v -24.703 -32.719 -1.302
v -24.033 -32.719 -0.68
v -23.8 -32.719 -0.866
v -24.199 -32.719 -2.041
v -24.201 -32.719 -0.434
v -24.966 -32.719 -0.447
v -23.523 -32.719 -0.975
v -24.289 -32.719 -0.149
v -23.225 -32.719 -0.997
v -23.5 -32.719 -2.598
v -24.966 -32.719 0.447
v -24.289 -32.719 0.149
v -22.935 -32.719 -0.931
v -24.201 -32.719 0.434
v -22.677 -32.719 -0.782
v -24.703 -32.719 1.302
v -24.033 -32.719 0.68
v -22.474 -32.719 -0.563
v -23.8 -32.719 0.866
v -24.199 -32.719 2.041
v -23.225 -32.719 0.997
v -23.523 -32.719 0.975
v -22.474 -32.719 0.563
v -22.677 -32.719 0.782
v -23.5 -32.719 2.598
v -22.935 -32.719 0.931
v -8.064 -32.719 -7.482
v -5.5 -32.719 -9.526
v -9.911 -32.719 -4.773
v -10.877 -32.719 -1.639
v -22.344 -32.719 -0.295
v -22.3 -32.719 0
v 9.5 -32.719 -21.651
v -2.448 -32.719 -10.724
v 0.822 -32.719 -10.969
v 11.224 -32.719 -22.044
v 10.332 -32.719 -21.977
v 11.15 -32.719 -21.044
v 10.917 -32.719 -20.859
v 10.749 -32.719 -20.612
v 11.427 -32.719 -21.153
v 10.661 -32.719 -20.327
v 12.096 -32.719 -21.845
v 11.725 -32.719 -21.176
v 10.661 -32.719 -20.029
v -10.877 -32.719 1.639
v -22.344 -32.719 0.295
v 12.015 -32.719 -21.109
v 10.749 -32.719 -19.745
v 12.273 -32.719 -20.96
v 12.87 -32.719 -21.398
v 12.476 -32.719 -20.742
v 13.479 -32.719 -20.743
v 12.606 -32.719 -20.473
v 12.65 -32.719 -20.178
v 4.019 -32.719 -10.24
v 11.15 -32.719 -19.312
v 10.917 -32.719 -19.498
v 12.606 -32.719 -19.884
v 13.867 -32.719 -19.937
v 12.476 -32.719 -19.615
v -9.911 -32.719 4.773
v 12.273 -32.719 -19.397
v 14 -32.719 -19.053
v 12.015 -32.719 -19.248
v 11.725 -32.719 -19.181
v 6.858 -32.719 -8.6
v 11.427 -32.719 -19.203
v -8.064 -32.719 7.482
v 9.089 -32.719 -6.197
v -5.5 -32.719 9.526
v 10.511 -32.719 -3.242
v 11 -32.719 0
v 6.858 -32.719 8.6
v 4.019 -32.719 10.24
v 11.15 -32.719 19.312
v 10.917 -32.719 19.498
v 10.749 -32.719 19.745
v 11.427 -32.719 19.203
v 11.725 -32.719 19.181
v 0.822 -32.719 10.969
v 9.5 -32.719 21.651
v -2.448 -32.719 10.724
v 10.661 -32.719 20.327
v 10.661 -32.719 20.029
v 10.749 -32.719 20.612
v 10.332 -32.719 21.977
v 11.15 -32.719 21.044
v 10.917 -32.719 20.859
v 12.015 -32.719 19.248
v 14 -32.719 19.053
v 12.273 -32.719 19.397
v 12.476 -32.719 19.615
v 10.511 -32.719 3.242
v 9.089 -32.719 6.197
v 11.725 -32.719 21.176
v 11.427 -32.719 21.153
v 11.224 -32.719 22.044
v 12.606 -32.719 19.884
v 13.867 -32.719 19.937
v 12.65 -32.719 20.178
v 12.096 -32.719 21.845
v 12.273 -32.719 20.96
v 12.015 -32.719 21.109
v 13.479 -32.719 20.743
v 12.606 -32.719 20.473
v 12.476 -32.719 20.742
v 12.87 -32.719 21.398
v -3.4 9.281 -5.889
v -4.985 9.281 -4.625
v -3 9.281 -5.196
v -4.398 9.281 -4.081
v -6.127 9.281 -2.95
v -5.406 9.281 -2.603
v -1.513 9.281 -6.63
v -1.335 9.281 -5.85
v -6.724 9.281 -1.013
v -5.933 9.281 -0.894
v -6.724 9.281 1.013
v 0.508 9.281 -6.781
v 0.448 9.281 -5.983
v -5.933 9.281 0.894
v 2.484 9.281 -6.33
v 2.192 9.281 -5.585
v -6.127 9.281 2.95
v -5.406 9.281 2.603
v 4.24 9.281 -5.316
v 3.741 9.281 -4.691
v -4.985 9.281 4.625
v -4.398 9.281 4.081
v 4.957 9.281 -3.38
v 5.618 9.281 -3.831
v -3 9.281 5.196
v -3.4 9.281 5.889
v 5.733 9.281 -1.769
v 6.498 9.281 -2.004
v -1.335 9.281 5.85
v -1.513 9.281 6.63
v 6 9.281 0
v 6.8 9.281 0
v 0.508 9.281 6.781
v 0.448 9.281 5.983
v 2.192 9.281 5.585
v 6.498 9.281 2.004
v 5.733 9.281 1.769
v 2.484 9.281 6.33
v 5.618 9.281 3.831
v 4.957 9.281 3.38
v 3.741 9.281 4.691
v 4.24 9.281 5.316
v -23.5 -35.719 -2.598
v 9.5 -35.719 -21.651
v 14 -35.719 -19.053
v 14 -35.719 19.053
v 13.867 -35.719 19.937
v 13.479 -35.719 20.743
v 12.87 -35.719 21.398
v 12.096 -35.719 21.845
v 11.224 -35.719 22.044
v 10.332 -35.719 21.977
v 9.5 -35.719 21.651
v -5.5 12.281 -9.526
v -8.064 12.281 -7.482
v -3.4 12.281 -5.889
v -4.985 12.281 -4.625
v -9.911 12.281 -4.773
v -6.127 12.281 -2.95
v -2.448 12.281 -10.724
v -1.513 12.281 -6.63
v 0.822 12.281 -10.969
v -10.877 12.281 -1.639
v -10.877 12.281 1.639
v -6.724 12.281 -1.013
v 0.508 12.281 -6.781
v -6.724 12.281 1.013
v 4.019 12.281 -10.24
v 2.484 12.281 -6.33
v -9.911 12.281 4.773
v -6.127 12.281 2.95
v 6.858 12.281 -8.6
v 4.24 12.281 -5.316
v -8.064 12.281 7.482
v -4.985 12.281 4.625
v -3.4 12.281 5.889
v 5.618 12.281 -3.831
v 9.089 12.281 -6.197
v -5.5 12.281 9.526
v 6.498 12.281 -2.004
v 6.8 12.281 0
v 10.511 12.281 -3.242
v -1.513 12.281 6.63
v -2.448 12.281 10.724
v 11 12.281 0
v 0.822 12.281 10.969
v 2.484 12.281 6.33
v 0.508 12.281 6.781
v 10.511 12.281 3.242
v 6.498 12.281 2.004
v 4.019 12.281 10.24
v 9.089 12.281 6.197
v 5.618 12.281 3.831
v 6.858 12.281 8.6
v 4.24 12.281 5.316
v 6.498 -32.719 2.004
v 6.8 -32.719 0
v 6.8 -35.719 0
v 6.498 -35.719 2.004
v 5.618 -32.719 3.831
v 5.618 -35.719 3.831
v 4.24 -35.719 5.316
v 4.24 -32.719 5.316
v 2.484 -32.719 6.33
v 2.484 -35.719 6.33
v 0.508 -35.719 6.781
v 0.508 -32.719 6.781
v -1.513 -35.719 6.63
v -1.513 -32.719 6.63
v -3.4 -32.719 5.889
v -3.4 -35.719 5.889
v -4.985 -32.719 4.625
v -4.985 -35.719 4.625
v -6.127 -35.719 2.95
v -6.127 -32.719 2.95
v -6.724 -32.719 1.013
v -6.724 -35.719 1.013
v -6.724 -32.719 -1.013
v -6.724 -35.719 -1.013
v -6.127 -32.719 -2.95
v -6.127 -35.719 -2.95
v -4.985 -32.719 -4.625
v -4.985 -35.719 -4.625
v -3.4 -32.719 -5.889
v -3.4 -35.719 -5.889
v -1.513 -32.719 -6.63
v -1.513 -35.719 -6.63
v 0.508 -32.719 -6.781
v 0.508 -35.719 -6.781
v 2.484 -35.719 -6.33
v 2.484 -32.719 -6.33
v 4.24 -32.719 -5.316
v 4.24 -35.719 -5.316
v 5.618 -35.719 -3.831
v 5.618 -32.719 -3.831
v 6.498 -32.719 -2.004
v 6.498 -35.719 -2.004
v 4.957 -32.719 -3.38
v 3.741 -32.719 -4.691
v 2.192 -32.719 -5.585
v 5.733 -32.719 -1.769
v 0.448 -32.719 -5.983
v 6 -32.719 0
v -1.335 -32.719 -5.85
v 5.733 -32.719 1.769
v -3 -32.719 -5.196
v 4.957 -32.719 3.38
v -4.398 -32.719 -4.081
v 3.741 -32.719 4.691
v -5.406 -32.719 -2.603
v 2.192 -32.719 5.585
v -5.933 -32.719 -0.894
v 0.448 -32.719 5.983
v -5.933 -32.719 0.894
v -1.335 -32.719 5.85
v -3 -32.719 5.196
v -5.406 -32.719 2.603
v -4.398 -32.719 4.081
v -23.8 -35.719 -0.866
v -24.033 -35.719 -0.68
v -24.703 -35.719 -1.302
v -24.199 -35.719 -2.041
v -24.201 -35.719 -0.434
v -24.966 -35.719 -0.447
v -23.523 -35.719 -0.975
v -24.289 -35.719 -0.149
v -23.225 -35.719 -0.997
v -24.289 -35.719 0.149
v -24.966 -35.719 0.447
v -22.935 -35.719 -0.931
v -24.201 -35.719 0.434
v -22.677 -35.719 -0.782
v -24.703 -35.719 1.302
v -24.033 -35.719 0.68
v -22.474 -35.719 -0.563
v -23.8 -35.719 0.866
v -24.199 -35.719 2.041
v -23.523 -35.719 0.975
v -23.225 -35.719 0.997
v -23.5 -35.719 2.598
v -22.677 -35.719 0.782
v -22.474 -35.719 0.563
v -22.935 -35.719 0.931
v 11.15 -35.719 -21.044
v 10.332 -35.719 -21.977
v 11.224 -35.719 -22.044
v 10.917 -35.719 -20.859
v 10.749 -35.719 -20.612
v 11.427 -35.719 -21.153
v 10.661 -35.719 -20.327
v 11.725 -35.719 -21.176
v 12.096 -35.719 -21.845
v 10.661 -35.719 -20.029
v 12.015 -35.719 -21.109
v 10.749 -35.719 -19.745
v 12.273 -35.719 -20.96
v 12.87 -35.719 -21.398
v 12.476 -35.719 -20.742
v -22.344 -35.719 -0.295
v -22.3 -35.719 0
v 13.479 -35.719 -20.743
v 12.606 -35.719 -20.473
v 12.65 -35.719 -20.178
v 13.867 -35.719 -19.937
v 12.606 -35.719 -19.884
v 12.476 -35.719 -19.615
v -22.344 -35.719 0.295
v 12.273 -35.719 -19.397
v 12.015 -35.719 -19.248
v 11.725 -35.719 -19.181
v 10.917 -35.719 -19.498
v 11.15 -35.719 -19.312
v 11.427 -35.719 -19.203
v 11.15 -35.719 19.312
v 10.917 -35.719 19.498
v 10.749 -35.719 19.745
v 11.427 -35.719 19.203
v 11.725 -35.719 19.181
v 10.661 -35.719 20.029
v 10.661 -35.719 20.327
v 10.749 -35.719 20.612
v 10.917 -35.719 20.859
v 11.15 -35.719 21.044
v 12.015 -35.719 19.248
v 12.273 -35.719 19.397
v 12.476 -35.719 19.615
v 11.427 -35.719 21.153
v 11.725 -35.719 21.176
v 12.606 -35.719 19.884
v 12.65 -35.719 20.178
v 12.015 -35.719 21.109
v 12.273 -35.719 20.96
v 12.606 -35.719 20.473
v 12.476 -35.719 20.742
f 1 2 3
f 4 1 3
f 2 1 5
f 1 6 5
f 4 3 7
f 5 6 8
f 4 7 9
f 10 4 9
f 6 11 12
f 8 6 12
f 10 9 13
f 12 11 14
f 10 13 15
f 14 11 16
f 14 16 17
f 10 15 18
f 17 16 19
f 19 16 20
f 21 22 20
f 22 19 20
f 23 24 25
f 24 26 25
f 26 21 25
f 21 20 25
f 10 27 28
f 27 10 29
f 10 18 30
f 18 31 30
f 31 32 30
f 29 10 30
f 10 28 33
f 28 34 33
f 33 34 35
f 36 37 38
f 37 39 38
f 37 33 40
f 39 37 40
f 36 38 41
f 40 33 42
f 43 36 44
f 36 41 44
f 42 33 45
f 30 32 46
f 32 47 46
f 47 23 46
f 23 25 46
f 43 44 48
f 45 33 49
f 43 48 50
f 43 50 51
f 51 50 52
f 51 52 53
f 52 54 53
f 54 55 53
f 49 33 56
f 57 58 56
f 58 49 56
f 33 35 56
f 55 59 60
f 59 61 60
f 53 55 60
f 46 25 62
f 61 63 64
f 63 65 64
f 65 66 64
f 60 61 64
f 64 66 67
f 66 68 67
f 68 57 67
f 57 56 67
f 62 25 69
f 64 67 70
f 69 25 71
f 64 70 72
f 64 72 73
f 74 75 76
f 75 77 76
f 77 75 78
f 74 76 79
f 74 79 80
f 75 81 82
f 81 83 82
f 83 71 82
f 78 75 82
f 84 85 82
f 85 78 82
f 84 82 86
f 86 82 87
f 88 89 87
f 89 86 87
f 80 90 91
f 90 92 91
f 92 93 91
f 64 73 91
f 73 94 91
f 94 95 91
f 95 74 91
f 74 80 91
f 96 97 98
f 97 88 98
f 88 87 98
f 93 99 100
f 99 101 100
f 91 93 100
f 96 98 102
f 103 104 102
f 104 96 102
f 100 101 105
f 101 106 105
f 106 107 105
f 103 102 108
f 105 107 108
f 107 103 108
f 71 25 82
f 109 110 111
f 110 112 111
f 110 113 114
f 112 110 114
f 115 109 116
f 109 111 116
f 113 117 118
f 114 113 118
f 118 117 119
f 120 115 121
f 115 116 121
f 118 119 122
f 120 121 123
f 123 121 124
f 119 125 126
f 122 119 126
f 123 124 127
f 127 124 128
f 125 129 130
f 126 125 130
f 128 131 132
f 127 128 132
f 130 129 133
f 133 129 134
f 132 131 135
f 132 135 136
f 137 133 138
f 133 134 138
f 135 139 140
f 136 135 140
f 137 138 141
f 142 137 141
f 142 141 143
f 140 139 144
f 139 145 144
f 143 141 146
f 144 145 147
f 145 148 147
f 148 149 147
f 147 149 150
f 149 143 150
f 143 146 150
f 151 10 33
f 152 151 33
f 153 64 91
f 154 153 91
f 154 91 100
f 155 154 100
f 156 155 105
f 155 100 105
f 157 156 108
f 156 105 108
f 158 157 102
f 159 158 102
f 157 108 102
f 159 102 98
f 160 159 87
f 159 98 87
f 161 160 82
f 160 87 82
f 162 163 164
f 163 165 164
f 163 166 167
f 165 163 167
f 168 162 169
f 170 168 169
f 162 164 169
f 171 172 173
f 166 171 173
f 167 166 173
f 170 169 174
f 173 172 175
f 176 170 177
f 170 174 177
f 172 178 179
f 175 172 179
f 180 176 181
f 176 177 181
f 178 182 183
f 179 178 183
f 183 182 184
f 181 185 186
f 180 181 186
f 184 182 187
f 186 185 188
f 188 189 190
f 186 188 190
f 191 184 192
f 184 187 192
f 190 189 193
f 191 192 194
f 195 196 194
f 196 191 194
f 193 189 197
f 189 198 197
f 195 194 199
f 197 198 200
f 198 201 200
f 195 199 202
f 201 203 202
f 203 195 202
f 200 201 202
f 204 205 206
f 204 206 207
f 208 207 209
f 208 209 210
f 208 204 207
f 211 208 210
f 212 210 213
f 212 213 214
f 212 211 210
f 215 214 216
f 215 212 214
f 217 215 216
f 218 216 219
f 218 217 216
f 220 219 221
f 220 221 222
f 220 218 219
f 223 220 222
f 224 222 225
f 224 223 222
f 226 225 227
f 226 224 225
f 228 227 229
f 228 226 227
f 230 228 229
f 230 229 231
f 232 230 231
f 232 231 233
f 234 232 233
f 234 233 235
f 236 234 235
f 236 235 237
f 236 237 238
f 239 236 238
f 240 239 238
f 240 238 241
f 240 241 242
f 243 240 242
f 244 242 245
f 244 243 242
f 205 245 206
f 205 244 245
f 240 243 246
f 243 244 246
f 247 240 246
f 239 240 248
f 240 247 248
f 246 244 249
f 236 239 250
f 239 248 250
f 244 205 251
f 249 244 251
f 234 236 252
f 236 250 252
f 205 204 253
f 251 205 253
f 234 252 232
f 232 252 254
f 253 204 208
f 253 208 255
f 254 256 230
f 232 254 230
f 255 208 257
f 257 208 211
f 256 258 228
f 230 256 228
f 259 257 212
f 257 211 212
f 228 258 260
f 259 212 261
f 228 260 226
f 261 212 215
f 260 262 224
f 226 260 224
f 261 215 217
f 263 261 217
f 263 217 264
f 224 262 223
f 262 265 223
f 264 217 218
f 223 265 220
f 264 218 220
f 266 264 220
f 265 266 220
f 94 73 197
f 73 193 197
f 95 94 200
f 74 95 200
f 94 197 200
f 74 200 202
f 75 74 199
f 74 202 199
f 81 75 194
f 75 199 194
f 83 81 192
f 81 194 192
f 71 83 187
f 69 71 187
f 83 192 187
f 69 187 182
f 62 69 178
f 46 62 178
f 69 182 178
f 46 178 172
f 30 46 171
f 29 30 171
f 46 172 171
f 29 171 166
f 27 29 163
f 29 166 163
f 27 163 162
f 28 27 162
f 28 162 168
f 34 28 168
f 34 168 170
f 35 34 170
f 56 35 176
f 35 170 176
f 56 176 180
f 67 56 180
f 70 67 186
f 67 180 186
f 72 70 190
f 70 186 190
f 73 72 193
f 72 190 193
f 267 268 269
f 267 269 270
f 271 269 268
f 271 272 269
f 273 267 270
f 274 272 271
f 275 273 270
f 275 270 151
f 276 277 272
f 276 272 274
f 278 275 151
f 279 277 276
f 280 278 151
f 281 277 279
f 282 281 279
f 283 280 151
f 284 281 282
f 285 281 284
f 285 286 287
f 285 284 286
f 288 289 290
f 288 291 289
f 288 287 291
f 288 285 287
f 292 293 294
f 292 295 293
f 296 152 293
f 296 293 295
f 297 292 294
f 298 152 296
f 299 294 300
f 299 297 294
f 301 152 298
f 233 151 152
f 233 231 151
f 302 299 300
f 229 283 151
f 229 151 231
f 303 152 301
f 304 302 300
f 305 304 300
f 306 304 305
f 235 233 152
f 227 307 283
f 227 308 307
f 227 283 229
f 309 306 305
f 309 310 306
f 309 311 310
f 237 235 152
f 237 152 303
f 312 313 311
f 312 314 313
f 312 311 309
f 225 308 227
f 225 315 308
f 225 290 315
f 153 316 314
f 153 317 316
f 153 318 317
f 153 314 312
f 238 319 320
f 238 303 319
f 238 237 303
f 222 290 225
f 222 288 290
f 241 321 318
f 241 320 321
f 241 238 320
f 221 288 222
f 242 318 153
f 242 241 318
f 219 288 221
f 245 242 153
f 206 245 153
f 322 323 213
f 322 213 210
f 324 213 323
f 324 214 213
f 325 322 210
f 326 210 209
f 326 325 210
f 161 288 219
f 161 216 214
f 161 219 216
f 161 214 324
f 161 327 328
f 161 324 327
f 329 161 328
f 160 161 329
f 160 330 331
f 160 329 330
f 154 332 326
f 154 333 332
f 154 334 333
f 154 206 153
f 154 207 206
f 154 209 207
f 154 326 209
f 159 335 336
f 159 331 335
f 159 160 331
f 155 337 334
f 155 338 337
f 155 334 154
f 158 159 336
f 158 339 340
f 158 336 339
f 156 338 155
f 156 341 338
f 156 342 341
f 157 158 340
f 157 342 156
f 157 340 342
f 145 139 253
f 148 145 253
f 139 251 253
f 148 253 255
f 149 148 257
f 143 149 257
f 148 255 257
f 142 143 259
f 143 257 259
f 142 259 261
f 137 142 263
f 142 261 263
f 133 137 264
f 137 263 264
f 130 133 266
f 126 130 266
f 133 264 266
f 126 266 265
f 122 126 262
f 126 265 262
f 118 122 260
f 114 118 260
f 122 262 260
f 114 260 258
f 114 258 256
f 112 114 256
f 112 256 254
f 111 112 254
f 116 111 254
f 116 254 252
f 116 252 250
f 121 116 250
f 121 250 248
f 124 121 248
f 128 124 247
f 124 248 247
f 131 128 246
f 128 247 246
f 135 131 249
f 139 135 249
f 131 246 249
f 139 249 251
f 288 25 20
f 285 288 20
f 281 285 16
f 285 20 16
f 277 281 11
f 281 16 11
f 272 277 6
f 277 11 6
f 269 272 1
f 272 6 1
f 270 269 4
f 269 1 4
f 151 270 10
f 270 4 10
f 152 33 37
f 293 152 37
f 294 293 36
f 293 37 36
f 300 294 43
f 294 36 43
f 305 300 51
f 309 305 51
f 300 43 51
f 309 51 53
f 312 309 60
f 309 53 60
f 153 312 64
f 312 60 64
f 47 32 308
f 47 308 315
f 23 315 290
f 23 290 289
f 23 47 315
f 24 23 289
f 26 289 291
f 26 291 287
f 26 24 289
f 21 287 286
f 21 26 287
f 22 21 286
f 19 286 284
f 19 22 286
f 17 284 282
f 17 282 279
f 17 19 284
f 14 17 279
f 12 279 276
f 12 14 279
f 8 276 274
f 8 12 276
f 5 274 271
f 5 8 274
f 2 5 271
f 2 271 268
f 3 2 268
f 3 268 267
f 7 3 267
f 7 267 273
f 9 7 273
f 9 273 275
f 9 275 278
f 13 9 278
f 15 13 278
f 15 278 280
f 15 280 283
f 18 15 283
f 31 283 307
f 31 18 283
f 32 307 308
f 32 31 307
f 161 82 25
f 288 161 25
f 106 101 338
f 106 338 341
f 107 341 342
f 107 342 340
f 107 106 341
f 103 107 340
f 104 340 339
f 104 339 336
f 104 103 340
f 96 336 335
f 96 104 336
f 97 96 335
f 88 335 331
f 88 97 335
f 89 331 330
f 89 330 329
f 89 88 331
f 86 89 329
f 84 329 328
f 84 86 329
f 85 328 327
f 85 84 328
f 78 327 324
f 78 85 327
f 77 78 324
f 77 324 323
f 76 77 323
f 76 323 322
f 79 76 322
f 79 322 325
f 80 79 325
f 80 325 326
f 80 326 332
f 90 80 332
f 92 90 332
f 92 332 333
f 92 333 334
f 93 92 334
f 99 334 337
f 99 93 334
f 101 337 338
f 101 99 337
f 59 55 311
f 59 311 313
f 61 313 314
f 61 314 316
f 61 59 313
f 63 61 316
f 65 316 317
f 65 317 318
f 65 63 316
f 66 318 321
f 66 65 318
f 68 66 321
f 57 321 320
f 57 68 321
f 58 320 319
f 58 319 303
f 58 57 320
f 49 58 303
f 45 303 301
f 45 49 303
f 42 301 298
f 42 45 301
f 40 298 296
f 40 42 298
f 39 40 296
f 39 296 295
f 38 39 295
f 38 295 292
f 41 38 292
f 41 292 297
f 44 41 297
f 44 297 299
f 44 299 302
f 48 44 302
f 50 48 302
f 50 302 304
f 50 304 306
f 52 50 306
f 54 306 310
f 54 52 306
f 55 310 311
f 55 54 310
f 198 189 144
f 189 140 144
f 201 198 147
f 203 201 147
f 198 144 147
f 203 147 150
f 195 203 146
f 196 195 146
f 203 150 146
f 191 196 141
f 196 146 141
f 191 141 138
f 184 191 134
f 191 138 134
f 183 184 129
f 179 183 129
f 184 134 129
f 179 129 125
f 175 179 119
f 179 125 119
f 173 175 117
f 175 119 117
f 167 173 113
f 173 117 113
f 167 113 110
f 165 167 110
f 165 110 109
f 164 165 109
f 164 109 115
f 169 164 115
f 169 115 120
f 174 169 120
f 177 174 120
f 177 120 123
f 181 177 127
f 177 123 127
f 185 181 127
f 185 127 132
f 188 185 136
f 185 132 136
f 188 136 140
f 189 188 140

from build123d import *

# Parameters (mm, degrees)
SKETCH2_R           = 6.8
SKETCH2_R_2         = 1
BOSS_EXTRUDE1_DEPTH = 3


with BuildPart() as part:
    # Sketch1 → Revolve1 (revolve)
    with BuildSketch(Plane.XY):
        Polygon((11, 12.28125), (6.8, 12.28125), (6.8, 9.28125), (6, 9.28125), (6, -32.71875), (11, -32.71875), align=None)
    revolve(axis=Axis((0, 17.71875, 0), (0, -1, 0)))

    # Sketch2 → Boss-Extrude1 (add)
    with BuildSketch(Plane.XZ.offset(32.71875)):
        with BuildLine():
            Line((-23.5, -2.598076211), (9.5, -21.650635095))
            ThreePointArc((9.5, -21.650635095), (12.5, -21.650635095), (14, -19.052558883))
            Line((14, -19.052558883), (14, 19.052558883))
            ThreePointArc((14, 19.052558883), (12.5, 21.650635095), (9.5, 21.650635095))
            Line((9.5, 21.650635095), (-23.5, 2.598076211))
            ThreePointArc((-23.5, 2.598076211), (-25, 0), (-23.5, -2.598076211))
        make_face()
        Circle(SKETCH2_R, mode=Mode.SUBTRACT)
        with Locations((11.65, 20.178391908)):
            Circle(SKETCH2_R_2, mode=Mode.SUBTRACT)
        with Locations((-23.3, 0)):
            Circle(SKETCH2_R_2, mode=Mode.SUBTRACT)
        with Locations((11.65, -20.178391908)):
            Circle(SKETCH2_R_2, mode=Mode.SUBTRACT)
    extrude(amount=BOSS_EXTRUDE1_DEPTH)


solid = part.part
